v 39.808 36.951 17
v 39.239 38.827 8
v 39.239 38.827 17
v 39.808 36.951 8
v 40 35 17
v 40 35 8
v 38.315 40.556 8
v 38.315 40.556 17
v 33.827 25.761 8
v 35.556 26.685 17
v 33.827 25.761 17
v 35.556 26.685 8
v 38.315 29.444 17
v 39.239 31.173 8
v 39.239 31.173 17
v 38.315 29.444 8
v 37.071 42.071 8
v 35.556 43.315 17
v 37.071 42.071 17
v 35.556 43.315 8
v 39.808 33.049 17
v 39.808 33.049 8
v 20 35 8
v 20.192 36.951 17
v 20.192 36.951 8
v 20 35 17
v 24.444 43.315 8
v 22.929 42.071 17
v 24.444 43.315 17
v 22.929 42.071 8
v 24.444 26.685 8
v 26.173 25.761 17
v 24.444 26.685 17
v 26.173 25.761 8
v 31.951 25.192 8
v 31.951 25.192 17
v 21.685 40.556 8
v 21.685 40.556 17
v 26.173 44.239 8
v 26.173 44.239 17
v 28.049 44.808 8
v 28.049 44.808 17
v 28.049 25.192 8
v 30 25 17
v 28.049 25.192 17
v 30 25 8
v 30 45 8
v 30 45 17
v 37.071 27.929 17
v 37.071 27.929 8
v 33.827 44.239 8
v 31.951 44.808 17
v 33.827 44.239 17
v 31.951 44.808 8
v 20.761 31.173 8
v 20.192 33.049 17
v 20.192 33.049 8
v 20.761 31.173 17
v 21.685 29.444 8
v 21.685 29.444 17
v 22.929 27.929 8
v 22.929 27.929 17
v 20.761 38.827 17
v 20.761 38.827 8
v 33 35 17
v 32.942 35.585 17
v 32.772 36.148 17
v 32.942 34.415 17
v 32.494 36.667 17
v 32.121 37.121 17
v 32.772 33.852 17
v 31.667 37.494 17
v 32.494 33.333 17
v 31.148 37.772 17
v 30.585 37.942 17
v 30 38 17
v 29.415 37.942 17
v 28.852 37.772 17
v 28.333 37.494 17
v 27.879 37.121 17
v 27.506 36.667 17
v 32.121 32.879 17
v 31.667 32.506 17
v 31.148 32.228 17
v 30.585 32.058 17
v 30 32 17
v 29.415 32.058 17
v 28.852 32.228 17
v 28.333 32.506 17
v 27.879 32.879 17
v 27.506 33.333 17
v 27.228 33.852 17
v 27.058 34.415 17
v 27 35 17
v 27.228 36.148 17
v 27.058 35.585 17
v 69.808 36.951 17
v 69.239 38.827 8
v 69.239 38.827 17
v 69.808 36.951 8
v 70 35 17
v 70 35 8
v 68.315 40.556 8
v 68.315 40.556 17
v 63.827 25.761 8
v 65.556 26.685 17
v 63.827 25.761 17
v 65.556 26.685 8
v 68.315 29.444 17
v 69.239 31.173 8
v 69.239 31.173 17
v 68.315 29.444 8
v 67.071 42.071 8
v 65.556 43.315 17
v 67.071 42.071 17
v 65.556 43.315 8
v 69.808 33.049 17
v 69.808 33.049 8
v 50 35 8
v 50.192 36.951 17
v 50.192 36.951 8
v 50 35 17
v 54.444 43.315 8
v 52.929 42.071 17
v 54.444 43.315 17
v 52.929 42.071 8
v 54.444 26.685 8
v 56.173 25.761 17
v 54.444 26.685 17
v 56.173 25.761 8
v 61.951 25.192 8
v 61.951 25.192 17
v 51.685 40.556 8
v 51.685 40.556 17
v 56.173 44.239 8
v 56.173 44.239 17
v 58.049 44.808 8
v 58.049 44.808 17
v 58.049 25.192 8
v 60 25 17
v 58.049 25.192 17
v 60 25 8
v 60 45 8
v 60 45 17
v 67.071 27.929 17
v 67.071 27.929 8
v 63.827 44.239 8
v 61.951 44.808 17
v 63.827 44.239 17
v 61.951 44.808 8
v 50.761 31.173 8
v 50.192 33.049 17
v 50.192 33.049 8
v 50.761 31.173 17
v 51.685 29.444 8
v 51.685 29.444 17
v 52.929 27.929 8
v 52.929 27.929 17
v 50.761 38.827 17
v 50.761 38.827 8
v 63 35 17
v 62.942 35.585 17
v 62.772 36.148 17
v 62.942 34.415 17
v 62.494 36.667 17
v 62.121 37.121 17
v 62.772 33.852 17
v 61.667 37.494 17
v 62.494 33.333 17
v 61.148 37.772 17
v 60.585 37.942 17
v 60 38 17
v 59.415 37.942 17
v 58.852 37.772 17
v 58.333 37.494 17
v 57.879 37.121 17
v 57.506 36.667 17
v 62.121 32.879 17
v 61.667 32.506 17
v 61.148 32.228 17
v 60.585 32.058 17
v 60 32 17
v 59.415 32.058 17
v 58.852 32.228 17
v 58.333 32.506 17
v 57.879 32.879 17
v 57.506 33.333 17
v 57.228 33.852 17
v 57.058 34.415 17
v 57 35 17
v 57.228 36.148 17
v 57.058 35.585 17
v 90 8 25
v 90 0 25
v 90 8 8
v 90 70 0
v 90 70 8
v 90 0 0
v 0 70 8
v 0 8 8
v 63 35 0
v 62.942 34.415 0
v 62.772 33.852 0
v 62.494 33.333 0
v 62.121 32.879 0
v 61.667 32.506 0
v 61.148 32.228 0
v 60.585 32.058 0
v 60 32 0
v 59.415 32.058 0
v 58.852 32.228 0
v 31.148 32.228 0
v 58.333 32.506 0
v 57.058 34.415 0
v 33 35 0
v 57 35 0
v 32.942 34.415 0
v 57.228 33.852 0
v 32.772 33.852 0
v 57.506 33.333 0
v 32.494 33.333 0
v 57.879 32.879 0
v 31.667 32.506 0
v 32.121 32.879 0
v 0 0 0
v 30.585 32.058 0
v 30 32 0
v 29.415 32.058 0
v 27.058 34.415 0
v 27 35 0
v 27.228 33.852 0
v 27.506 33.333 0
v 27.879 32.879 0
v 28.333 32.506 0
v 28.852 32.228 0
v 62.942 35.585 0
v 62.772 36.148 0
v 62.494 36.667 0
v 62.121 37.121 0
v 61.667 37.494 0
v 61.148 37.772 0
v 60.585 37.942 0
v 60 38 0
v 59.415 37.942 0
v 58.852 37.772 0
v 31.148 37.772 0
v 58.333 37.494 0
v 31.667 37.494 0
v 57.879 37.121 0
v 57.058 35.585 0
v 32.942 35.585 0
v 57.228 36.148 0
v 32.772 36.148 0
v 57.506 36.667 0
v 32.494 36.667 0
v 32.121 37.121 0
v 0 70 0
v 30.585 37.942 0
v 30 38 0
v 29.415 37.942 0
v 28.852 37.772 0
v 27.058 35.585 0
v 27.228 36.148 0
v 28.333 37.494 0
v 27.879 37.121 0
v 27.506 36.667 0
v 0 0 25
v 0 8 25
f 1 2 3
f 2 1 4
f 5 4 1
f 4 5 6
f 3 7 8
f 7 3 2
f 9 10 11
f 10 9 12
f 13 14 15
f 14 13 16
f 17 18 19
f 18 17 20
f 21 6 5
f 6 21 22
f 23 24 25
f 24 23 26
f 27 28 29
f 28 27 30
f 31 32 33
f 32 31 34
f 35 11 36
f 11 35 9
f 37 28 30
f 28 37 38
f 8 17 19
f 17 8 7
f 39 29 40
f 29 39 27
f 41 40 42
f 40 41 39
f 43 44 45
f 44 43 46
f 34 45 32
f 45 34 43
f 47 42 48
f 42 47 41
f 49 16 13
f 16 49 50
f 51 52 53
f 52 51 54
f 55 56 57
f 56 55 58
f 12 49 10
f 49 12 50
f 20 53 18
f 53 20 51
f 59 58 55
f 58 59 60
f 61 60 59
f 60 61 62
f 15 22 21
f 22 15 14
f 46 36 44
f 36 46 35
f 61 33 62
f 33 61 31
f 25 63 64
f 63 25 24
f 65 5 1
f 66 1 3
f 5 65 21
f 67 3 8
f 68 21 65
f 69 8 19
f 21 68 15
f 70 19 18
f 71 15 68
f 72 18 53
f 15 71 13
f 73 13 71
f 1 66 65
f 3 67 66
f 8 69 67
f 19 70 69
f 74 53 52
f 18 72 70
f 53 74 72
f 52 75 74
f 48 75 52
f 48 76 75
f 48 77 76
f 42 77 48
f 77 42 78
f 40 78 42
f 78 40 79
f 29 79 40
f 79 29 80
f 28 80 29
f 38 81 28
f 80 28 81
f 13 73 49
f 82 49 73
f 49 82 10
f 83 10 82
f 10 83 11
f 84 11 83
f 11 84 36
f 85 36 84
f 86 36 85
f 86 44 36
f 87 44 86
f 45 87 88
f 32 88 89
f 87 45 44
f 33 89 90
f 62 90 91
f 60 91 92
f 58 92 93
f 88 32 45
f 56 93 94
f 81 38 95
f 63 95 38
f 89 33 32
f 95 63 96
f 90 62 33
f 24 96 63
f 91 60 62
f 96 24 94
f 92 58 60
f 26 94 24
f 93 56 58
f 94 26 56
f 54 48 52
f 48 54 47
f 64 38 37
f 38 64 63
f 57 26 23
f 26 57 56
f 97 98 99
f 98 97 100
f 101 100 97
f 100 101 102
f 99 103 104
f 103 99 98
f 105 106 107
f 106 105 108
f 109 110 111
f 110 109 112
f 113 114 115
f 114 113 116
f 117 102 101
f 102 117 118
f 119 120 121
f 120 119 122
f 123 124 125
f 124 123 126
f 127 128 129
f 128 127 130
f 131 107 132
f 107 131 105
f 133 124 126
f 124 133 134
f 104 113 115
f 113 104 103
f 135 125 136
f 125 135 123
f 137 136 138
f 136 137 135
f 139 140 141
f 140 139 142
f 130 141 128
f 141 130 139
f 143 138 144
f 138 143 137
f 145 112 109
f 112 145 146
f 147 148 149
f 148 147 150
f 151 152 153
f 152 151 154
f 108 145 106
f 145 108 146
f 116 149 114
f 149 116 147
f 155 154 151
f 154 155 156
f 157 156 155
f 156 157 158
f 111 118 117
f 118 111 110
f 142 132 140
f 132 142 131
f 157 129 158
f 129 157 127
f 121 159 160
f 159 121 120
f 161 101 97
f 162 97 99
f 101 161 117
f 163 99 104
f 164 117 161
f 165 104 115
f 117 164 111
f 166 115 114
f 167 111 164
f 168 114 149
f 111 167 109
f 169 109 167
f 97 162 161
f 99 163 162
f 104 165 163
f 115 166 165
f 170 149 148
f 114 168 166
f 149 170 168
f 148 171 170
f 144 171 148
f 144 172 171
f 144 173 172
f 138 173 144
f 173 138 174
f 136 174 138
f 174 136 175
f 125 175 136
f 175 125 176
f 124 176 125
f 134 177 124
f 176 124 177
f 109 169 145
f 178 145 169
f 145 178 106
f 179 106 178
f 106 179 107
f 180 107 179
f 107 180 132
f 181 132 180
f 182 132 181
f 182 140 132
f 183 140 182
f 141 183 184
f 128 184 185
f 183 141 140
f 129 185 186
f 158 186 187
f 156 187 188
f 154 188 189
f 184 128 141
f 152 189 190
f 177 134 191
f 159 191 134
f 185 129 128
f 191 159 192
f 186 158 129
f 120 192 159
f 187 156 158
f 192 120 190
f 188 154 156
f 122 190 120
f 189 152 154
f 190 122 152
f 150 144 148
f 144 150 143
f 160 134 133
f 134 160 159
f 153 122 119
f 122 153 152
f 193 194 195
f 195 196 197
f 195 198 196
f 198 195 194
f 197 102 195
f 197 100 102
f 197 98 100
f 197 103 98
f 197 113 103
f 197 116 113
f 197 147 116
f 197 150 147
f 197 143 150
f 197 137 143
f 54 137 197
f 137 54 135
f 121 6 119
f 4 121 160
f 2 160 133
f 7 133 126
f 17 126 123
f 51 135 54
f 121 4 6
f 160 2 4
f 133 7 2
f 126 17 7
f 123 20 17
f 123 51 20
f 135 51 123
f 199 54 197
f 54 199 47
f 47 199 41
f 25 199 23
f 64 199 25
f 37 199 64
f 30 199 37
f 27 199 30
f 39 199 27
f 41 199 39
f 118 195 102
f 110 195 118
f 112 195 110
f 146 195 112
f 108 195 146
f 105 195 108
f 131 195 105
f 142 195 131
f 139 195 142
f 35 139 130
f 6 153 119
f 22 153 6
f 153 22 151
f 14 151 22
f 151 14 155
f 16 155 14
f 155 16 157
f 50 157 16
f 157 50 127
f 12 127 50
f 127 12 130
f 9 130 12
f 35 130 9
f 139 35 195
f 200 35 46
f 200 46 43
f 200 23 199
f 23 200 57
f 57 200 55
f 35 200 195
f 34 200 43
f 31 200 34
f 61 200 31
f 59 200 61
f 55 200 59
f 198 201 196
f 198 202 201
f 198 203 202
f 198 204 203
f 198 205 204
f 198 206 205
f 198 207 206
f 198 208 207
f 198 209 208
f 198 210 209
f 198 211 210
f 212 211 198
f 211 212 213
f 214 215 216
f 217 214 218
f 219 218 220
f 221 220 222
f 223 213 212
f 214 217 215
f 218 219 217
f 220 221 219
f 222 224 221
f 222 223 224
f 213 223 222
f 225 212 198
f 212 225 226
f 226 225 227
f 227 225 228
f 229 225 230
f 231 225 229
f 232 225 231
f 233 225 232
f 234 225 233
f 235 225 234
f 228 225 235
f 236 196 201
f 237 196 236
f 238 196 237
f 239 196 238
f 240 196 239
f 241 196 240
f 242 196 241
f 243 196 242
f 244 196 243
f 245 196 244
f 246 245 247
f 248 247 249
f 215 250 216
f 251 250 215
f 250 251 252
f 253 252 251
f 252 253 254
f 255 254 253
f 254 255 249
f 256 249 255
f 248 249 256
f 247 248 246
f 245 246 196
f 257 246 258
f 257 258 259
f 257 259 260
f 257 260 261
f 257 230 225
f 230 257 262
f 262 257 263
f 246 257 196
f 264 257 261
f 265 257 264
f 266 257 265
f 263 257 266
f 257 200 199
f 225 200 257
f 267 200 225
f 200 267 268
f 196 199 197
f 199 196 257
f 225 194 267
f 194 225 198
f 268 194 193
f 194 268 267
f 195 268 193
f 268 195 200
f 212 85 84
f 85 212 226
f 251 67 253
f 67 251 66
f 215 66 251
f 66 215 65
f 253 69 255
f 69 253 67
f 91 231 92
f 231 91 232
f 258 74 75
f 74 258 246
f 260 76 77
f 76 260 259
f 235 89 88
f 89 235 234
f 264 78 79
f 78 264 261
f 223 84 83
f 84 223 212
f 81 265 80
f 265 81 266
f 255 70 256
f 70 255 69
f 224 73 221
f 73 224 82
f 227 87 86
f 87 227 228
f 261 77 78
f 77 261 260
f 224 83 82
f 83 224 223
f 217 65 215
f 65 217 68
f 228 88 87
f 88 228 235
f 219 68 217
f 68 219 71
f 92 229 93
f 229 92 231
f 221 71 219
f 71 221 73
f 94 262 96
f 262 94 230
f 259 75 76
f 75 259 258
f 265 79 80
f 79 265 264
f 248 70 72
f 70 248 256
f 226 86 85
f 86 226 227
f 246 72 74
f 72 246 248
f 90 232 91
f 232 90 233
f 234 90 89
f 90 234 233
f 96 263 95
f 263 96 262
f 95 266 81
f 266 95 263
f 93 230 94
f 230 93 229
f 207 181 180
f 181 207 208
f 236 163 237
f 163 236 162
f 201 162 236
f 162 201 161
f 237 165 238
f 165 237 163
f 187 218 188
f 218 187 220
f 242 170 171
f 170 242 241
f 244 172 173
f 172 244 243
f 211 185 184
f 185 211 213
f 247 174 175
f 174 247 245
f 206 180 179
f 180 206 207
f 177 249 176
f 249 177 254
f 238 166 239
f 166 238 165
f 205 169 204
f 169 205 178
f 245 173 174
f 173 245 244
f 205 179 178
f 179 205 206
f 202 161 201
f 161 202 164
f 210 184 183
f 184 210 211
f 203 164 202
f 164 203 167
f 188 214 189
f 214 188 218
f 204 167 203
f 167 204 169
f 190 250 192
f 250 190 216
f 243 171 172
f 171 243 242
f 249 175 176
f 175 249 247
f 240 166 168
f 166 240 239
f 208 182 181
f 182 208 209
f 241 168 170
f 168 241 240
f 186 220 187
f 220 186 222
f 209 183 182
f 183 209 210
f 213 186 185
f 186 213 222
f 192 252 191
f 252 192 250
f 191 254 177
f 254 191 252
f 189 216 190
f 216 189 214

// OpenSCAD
$fn = 32;

// ----------------------------------------------------------------------
// Drill jig: fence jig
// ----------------------------------------------------------------------

// --- parameters (mm) ---
plate_l = 90;             // plate length, X
plate_w = 70;             // plate width, Y
plate_t = 8;              // plate thickness
boss_d = 20;              // guide boss diameter
boss_h = 10;              // boss height above the plate
guide_d = 6;              // guide hole diameter
boss_pitch = 30;          // boss pitch
fence_h = 18;             // fence height above the plate
fence_t = 8;              // fence thickness

n_boss = 2;  // guide bosses
boss_x0 = (plate_l - (n_boss - 1) * boss_pitch) / 2;  // first boss X
boss_top = plate_t - 1 + boss_h;  // boss crown height
fence_top = plate_t - 1 + fence_h;  // fence crown height
total_h = max([fence_top, boss_top]);  // overall height

difference() {
  union() {
  cube([plate_l, plate_w, plate_t]);
  for (i = [0 : n_boss - 1])
    translate([boss_x0 + i * boss_pitch, plate_w / 2, plate_t - 1])
      cylinder(h = boss_h, d = boss_d);
  translate([0, 0, plate_t - 1]) cube([plate_l, fence_t, fence_h]);
  }
  for (i = [0 : n_boss - 1])
    translate([boss_x0 + i * boss_pitch, plate_w / 2, -1])
      cylinder(h = plate_t + boss_h, d = guide_d);
}
